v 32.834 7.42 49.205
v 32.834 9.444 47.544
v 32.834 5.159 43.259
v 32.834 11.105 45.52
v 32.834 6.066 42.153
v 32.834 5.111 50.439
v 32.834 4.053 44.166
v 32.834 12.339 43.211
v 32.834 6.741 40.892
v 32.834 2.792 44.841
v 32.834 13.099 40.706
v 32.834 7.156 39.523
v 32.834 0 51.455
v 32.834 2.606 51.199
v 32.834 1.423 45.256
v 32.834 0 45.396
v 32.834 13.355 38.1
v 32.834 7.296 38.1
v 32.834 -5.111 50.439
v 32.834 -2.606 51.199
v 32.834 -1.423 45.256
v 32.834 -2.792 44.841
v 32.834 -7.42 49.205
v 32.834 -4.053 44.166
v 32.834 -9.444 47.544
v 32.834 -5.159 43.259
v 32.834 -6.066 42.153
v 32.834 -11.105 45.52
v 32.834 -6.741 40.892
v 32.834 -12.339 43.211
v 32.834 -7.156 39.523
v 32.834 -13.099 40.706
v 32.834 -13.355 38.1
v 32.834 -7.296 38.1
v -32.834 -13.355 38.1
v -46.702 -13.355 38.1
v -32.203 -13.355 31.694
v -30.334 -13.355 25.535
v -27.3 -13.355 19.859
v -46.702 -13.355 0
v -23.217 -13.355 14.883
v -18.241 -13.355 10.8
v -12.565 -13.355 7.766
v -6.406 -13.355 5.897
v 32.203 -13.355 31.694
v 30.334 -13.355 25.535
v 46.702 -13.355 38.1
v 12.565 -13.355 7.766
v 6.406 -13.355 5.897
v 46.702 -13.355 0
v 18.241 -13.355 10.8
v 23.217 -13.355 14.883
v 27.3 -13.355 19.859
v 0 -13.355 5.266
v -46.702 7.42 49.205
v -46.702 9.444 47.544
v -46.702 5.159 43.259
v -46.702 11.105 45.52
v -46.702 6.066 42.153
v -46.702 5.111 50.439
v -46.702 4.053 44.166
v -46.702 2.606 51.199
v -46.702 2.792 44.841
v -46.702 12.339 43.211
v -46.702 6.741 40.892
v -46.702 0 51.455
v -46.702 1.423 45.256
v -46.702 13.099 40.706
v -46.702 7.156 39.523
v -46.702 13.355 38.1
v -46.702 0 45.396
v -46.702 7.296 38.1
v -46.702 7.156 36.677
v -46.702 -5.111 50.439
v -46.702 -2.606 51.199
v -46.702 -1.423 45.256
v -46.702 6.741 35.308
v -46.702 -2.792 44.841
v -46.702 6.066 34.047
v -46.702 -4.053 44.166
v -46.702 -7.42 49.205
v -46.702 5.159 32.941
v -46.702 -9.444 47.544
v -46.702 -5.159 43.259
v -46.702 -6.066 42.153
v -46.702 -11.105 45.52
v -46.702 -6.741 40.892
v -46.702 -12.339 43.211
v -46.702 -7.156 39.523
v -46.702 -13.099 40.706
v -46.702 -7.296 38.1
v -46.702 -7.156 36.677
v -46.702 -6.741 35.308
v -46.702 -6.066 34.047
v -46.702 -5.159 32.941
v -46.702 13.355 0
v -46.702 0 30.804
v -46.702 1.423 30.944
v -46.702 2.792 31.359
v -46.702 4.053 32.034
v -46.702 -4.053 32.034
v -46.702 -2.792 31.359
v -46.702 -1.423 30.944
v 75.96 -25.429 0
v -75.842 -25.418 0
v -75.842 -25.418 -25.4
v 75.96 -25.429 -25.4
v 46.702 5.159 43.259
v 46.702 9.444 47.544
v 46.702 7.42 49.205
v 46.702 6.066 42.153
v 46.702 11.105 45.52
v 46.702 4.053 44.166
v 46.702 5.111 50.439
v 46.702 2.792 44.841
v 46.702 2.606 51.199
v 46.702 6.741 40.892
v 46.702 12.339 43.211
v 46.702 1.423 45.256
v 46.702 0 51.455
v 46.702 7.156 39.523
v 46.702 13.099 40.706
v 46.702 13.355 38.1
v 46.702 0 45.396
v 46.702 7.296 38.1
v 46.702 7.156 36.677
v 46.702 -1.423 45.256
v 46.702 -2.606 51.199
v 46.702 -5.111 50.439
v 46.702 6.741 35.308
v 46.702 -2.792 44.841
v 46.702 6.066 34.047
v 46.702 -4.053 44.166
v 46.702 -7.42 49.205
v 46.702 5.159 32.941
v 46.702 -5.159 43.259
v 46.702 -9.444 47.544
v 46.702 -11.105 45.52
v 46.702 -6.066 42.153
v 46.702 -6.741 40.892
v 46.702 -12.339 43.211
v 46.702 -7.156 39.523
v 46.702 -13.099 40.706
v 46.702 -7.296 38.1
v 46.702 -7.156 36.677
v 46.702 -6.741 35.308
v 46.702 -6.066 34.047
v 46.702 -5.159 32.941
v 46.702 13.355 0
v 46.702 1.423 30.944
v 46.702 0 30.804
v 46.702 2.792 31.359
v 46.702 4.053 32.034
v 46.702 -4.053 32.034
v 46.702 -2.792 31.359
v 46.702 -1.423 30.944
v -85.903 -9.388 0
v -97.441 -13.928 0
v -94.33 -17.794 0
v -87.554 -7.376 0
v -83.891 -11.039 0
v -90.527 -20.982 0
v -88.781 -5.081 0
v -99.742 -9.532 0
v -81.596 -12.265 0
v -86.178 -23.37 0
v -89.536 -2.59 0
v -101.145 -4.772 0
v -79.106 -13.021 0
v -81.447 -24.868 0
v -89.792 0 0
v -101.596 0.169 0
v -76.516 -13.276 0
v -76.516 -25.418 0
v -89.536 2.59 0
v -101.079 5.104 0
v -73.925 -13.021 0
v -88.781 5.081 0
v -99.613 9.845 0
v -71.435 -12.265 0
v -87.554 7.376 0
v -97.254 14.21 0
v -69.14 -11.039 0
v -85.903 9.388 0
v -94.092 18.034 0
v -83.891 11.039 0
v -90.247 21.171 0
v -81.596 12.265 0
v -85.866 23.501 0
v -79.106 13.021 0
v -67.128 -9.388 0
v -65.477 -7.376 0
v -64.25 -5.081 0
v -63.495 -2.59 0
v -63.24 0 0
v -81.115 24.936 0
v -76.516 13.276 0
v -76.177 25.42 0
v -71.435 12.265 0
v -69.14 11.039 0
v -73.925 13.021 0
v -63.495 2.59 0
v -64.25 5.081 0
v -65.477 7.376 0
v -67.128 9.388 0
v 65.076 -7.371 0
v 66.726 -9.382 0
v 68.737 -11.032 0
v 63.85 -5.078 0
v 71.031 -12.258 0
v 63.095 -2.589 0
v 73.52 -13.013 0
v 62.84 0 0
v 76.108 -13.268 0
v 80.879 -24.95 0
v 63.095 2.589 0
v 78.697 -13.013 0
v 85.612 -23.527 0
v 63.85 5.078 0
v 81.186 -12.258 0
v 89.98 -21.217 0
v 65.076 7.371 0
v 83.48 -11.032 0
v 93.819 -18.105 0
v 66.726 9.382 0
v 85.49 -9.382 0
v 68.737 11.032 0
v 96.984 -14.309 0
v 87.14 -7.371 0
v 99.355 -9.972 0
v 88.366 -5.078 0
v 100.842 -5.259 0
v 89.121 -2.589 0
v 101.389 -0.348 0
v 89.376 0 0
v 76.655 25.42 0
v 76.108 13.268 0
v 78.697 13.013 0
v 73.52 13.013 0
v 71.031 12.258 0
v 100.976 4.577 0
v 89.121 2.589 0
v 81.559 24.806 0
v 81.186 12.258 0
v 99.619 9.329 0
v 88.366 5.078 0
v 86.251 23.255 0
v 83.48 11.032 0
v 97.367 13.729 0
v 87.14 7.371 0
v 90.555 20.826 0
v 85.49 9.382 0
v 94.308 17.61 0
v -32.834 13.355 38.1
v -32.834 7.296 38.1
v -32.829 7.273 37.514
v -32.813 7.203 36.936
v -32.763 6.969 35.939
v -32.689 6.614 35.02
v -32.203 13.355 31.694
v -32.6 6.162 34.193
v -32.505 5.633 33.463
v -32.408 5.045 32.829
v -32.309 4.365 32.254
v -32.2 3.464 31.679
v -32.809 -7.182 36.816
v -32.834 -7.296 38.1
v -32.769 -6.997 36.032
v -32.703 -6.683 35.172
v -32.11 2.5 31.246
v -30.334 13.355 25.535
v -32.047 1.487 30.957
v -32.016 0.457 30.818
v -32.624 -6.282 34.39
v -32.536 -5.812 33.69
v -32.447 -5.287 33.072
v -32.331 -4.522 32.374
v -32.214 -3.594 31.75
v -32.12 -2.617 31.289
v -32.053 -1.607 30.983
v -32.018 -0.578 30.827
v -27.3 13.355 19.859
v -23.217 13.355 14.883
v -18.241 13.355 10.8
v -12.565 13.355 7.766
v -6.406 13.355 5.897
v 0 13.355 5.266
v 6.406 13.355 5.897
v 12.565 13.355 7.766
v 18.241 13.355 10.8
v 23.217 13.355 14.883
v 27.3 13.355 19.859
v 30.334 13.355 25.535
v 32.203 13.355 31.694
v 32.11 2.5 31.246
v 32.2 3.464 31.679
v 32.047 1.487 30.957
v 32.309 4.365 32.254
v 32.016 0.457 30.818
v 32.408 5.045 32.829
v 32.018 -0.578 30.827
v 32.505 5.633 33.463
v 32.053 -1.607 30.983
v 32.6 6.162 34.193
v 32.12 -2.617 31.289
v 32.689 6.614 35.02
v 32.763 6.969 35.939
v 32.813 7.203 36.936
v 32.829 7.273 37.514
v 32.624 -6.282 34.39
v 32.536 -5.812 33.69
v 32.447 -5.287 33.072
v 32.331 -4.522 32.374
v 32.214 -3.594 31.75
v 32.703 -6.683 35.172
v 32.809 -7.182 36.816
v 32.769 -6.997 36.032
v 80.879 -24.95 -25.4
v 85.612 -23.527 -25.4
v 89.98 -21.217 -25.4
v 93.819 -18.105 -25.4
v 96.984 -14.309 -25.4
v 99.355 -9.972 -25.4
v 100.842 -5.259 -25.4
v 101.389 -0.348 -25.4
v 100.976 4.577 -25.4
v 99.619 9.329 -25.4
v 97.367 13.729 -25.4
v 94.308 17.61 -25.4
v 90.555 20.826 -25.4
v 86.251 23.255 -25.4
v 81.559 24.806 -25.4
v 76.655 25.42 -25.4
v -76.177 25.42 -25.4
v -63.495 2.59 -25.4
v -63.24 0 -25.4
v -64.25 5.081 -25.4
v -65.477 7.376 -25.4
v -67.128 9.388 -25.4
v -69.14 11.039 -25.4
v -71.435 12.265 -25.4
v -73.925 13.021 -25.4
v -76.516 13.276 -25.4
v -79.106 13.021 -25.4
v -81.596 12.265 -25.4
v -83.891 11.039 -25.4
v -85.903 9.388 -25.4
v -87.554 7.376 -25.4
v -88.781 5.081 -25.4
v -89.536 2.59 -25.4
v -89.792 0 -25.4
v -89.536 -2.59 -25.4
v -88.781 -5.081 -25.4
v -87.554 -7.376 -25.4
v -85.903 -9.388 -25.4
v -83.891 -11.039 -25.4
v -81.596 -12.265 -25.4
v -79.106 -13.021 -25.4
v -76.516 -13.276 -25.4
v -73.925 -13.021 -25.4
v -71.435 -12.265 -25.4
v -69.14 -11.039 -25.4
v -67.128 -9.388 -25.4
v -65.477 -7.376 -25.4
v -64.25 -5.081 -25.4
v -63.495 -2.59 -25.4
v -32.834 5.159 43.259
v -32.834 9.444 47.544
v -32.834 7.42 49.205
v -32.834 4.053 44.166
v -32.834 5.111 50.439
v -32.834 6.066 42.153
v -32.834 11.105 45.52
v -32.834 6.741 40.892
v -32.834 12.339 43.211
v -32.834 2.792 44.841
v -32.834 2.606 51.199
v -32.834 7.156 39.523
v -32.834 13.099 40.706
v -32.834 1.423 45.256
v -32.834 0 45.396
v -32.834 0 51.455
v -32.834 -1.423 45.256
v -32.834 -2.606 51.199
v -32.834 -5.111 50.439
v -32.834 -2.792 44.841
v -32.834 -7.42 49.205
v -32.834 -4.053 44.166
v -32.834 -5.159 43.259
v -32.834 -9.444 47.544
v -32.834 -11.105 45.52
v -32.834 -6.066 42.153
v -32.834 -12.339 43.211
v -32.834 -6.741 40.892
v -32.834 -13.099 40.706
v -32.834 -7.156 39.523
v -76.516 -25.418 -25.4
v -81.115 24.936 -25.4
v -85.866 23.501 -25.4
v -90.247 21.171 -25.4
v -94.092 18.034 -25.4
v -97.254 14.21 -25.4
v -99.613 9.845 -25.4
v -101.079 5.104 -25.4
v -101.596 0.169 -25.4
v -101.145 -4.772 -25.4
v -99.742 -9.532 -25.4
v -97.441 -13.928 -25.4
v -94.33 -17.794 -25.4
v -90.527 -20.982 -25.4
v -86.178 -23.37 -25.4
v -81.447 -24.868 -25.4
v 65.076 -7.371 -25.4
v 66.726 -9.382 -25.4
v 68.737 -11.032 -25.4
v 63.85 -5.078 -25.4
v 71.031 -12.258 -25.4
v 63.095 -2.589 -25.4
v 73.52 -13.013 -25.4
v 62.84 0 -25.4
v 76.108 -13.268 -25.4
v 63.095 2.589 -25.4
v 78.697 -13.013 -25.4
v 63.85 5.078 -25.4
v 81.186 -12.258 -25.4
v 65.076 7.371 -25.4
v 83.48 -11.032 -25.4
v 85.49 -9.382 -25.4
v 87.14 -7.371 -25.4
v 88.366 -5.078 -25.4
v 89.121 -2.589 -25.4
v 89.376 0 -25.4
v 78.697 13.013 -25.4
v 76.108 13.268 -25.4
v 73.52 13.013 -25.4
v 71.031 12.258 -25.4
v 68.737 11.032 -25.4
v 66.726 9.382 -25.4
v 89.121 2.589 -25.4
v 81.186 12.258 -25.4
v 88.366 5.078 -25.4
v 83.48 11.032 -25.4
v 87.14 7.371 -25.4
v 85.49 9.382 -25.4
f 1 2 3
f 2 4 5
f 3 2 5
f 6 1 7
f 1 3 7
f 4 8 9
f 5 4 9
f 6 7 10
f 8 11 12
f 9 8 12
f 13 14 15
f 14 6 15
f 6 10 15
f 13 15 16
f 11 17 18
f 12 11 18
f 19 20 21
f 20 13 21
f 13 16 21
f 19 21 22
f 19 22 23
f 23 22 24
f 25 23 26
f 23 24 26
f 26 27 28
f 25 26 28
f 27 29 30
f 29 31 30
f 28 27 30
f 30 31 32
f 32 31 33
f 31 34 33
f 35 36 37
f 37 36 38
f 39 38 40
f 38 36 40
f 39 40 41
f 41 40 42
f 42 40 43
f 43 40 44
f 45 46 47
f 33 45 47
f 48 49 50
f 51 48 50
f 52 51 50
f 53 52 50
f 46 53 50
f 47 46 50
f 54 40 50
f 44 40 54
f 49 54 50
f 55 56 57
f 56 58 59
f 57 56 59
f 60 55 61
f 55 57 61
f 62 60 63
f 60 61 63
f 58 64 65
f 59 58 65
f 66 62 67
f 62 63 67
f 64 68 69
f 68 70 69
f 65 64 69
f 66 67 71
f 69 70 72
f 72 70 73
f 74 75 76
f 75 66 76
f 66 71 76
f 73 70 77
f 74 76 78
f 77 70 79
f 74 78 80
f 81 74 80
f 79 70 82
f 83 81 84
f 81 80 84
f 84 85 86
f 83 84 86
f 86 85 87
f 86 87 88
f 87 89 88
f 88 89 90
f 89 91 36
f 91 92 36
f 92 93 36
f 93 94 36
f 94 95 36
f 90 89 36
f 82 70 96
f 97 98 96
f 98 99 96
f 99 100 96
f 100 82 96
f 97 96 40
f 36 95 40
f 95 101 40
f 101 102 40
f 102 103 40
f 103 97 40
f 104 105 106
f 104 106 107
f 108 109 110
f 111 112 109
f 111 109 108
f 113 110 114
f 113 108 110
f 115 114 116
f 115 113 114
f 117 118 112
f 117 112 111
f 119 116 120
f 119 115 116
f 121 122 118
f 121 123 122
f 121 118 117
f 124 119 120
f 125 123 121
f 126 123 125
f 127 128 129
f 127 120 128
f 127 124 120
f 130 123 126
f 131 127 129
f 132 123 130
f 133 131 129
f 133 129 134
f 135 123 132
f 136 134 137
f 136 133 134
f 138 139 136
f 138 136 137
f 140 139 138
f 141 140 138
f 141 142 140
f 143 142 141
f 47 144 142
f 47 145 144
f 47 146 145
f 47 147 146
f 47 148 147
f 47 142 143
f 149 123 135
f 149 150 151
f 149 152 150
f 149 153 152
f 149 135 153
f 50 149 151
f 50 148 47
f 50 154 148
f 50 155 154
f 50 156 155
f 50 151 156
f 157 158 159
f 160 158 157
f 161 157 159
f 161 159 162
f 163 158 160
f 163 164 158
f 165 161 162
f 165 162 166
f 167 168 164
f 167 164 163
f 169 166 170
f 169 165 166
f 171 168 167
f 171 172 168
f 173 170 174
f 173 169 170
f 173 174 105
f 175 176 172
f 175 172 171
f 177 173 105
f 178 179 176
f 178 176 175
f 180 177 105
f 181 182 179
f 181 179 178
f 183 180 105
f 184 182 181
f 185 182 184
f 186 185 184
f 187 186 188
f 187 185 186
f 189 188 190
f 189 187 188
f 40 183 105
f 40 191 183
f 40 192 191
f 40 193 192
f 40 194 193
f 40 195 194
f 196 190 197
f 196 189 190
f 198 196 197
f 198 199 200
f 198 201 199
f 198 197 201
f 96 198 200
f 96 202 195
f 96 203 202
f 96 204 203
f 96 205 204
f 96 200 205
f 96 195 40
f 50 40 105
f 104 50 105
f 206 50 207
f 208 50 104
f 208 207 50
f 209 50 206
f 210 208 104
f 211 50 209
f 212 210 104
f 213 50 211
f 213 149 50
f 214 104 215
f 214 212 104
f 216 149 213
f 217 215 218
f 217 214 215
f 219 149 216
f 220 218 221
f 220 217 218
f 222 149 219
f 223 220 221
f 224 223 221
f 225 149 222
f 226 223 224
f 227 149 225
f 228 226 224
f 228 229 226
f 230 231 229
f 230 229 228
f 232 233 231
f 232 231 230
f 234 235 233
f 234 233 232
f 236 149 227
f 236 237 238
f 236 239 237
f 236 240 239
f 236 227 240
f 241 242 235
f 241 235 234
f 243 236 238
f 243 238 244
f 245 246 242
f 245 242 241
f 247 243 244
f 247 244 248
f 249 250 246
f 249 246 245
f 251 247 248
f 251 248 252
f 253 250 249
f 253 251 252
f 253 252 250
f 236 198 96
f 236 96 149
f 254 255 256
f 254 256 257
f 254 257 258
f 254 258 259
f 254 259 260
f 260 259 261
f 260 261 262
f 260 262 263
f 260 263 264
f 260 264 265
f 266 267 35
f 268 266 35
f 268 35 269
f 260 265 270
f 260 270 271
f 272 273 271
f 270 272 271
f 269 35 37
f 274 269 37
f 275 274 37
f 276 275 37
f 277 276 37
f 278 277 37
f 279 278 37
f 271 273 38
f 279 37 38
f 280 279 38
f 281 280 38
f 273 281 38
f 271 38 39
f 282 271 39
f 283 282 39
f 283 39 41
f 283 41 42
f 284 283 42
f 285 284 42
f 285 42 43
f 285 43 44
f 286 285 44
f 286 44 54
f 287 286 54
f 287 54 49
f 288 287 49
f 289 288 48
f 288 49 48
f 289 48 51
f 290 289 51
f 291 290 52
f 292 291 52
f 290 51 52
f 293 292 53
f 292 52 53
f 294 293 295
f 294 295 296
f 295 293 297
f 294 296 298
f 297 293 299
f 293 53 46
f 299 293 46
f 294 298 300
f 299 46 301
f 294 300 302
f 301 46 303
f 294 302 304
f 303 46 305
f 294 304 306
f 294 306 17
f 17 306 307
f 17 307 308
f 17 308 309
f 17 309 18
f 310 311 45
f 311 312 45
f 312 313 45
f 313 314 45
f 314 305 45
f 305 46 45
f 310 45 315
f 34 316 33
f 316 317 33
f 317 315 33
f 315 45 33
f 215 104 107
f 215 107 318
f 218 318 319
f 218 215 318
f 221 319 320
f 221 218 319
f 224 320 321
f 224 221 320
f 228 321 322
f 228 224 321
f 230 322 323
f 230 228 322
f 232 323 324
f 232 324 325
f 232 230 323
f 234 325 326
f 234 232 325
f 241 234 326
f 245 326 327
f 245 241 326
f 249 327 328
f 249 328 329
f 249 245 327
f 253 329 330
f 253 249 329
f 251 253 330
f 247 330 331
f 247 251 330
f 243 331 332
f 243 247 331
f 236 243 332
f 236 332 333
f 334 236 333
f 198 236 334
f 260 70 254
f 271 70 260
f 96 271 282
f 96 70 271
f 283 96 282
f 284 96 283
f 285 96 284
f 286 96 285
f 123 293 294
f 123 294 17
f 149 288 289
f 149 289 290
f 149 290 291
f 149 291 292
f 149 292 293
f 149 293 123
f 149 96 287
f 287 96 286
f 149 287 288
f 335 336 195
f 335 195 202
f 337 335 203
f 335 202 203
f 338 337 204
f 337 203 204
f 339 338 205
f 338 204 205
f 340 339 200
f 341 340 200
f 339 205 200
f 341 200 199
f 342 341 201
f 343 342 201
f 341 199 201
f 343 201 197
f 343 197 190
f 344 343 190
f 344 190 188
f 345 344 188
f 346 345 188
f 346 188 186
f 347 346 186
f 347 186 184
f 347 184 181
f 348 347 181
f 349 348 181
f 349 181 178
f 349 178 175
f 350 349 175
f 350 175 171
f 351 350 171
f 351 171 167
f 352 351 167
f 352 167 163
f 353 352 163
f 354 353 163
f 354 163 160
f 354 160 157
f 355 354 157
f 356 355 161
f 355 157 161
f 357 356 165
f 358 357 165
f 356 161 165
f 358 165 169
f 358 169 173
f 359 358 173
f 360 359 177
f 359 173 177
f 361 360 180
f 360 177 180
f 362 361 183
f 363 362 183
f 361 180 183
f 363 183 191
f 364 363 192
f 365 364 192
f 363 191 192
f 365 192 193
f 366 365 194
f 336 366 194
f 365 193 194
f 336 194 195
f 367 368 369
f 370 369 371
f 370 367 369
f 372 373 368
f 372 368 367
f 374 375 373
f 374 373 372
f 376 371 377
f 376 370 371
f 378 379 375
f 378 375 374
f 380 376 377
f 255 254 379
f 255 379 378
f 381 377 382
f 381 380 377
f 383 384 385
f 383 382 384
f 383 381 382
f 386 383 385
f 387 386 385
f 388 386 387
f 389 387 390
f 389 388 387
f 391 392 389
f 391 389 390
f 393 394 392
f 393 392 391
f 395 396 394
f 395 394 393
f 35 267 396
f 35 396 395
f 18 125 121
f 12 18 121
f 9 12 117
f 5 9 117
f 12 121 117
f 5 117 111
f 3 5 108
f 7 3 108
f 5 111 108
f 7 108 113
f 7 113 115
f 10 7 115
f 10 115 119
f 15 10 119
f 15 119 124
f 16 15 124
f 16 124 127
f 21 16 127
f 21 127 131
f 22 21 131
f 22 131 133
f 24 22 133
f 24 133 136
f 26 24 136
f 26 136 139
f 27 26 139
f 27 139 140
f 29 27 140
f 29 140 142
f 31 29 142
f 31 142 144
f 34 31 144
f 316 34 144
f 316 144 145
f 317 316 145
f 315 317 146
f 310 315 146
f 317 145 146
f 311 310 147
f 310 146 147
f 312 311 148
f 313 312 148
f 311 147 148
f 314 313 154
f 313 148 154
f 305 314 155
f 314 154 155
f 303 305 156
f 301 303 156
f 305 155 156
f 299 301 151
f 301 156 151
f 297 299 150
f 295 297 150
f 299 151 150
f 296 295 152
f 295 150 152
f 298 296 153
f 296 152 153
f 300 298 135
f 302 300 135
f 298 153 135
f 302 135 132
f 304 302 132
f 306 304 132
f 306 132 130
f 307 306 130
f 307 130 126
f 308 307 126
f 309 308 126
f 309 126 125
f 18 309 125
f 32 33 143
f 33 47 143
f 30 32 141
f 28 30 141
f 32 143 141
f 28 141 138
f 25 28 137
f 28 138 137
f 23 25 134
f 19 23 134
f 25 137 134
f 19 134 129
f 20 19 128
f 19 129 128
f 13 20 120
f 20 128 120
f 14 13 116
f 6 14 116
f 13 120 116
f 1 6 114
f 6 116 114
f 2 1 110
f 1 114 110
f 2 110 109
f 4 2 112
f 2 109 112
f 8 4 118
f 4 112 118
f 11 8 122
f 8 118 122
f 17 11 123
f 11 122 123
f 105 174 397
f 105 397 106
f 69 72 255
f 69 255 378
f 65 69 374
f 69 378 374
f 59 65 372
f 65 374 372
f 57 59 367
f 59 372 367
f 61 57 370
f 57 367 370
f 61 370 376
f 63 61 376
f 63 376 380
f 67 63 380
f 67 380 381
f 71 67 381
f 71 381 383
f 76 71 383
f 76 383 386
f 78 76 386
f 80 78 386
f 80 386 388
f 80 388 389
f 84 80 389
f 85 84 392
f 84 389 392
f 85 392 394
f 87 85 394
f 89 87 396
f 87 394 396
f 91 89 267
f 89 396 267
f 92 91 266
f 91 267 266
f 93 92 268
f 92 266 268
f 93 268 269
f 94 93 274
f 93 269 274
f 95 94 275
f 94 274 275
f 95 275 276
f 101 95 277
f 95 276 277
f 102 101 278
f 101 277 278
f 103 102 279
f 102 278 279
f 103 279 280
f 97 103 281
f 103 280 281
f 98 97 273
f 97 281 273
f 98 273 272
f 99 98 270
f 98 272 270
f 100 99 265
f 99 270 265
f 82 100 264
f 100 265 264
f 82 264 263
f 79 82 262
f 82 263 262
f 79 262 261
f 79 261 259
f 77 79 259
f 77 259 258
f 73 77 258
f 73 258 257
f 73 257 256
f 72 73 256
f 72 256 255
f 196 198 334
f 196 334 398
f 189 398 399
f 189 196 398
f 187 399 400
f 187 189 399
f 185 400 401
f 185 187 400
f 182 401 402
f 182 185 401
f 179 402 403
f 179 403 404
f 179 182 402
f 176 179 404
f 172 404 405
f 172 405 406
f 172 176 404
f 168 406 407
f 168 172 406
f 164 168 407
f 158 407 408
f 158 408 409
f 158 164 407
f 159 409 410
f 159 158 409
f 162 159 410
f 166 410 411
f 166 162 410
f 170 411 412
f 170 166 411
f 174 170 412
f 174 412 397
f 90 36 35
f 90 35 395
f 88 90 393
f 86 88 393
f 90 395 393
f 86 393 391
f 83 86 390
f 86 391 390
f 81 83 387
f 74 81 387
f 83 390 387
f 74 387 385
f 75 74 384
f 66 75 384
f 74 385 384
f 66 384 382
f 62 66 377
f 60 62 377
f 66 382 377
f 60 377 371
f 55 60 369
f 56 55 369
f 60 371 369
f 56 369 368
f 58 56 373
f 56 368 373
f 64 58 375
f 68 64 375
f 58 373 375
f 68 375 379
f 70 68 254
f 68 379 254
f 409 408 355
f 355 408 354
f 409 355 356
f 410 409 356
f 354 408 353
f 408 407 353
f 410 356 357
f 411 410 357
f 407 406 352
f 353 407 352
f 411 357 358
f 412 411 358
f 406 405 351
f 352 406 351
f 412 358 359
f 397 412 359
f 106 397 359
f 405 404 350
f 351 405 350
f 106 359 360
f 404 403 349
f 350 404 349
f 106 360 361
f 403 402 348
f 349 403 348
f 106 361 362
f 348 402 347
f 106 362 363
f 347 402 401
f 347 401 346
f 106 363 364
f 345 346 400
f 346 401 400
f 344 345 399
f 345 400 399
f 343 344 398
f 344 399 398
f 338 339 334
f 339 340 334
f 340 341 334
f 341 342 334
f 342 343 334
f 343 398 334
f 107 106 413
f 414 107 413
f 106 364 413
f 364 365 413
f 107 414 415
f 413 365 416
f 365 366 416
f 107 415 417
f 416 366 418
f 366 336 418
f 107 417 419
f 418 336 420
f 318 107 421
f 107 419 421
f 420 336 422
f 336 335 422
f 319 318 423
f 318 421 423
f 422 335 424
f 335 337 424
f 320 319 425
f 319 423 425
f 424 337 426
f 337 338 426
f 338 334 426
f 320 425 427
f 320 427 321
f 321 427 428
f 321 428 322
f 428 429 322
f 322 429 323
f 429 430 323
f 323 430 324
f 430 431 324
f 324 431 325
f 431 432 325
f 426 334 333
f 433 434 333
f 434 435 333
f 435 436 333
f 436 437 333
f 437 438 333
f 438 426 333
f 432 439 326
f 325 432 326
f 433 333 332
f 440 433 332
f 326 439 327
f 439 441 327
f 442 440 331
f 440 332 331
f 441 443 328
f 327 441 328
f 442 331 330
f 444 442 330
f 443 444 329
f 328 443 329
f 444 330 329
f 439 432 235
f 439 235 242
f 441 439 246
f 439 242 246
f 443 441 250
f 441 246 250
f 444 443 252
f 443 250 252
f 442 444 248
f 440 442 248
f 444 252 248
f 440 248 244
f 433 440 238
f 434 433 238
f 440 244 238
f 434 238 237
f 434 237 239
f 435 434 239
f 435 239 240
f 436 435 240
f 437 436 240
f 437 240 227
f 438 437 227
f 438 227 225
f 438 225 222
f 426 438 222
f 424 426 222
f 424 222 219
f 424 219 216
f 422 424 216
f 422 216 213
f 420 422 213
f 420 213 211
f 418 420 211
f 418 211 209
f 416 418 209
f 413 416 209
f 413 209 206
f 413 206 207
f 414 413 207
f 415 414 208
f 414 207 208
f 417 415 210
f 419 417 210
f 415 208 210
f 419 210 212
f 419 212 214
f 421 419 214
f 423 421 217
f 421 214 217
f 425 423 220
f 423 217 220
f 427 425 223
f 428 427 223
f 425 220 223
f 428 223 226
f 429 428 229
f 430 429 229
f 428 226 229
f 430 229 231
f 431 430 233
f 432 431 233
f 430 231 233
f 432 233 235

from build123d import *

# Parameters (mm, degrees)
F1_DEPTH  = 25.4
F2_R      = 13.276000262
F2_R_2    = 13.2682995005
F3_DEPTH  = 25.401
F4_W      = 93.4033617377
F4_H      = 26.7108418047
F5_DEPTH  = 38.1
F7_DEPTH  = 38.7764468004
F8_W      = 13.8678809612
F8_H      = 13.3554209024
F10_W     = 13.8678809612
F10_H     = 13.3554209024
F12_R     = 7.2961066279
F13_DEPTH = 148.2995960076


with BuildPart() as f1:
    # F0 (on Top) → F1 (new body)
    with BuildSketch(Plane.XY):
        with BuildLine():
            ThreePointArc((-76.1768892407, 25.420025898), (-58.2022165503, 17.9746726904), (-50.7568633427, 0))
            ThreePointArc((-50.7568633427, 0), (-58.0842609925, -17.8559379403), (-75.8421658524, -25.4178220332))
            Line((-75.8421658524, -25.4178220332), (75.9601819019, -25.4294734106))
            ThreePointArc((75.9601819019, -25.4294734106), (50.5350089445, -0.3456126871), (75.2690210938, 25.420025898))
            Line((75.2690210938, 25.420025898), (-76.1768892407, 25.420025898))
        make_face()
        with BuildLine():
            ThreePointArc((-75.8421658524, -25.4178220332), (-58.0842609925, -17.8559379403), (-50.7568633427, 0))
            ThreePointArc((-50.7568633427, 0), (-58.2022165503, 17.9746726904), (-76.1768892407, 25.420025898))
            ThreePointArc((-76.1768892407, 25.420025898), (-101.5963512458, 0.1693163576), (-76.5155144441, -25.4177703512))
            Line((-76.5155144441, -25.4177703512), (-75.8421658524, -25.4178220332))
        make_face()
        with BuildLine():
            Line((76.6552463174, 25.420025898), (75.2690210938, 25.420025898))
            ThreePointArc((75.2690210938, 25.420025898), (50.5350089445, -0.3456126871), (75.9601819019, -25.4294734106))
            ThreePointArc((75.9601819019, -25.4294734106), (93.9427967691, -17.9820431972), (101.3916071911, 0))
            ThreePointArc((101.3916071911, 0), (94.186891736, 17.7346078751), (76.6552463174, 25.420025898))
        make_face()
    extrude(amount=-F1_DEPTH)

    # F2 (on face) → F3 (cut, through all)
    with BuildSketch(Plane.XY):
        with Locations((-76.5155144441, 0)):
            Circle(F2_R)
        with Locations((76.1081134062, 0)):
            Circle(F2_R_2)
    extrude(amount=-F3_DEPTH, mode=Mode.SUBTRACT)

    # F4 (on face) → F5 (join)
    with BuildSketch(Plane.XY):
        Rectangle(F4_W, F4_H)
    extrude(amount=F5_DEPTH)

    # F6 (on face) → F7 (cut, through all)
    with BuildSketch(Plane.XZ.offset(13.3554209024)):
        with BuildLine():
            ThreePointArc((-32.8337999076, 38.1), (0, 5.2662000924), (32.8337999076, 38.1))
            Line((32.8337999076, 38.1), (-32.8337999076, 38.1))
        make_face()
        with BuildLine():
            Line((-32.8337999076, 38.1), (32.8337999076, 38.1))
            ThreePointArc((32.8337999076, 38.1), (0, 70.9337999076), (-32.8337999076, 38.1))
        make_face()
    extrude(amount=-F7_DEPTH, mode=Mode.SUBTRACT)

    # F8 (on face) → F9 (revolve)
    with BuildSketch(Plane.XY.offset(38.1)):
        with Locations((39.7677403882, 6.6777104512)):
            Rectangle(F8_W, F8_H)
    revolve(axis=Axis((39.7677403882, 0, 38.1), (-1, 0, 0)))

    # F10 (on face) → F11 (revolve)
    with BuildSketch(Plane.XY.offset(38.1)):
        with Locations((-39.7677403882, 6.6777104512)):
            Rectangle(F10_W, F10_H)
    revolve(axis=Axis((-39.7677403882, 0, 38.1), (-1, 0, 0)))

    # F12 (on face) → F13 (cut, through all)
    with BuildSketch(Plane.YZ.offset(46.7016808689)):
        with Locations((0, 38.1)):
            Circle(F12_R)
    extrude(amount=-F13_DEPTH, mode=Mode.SUBTRACT)


solid = f1.part
